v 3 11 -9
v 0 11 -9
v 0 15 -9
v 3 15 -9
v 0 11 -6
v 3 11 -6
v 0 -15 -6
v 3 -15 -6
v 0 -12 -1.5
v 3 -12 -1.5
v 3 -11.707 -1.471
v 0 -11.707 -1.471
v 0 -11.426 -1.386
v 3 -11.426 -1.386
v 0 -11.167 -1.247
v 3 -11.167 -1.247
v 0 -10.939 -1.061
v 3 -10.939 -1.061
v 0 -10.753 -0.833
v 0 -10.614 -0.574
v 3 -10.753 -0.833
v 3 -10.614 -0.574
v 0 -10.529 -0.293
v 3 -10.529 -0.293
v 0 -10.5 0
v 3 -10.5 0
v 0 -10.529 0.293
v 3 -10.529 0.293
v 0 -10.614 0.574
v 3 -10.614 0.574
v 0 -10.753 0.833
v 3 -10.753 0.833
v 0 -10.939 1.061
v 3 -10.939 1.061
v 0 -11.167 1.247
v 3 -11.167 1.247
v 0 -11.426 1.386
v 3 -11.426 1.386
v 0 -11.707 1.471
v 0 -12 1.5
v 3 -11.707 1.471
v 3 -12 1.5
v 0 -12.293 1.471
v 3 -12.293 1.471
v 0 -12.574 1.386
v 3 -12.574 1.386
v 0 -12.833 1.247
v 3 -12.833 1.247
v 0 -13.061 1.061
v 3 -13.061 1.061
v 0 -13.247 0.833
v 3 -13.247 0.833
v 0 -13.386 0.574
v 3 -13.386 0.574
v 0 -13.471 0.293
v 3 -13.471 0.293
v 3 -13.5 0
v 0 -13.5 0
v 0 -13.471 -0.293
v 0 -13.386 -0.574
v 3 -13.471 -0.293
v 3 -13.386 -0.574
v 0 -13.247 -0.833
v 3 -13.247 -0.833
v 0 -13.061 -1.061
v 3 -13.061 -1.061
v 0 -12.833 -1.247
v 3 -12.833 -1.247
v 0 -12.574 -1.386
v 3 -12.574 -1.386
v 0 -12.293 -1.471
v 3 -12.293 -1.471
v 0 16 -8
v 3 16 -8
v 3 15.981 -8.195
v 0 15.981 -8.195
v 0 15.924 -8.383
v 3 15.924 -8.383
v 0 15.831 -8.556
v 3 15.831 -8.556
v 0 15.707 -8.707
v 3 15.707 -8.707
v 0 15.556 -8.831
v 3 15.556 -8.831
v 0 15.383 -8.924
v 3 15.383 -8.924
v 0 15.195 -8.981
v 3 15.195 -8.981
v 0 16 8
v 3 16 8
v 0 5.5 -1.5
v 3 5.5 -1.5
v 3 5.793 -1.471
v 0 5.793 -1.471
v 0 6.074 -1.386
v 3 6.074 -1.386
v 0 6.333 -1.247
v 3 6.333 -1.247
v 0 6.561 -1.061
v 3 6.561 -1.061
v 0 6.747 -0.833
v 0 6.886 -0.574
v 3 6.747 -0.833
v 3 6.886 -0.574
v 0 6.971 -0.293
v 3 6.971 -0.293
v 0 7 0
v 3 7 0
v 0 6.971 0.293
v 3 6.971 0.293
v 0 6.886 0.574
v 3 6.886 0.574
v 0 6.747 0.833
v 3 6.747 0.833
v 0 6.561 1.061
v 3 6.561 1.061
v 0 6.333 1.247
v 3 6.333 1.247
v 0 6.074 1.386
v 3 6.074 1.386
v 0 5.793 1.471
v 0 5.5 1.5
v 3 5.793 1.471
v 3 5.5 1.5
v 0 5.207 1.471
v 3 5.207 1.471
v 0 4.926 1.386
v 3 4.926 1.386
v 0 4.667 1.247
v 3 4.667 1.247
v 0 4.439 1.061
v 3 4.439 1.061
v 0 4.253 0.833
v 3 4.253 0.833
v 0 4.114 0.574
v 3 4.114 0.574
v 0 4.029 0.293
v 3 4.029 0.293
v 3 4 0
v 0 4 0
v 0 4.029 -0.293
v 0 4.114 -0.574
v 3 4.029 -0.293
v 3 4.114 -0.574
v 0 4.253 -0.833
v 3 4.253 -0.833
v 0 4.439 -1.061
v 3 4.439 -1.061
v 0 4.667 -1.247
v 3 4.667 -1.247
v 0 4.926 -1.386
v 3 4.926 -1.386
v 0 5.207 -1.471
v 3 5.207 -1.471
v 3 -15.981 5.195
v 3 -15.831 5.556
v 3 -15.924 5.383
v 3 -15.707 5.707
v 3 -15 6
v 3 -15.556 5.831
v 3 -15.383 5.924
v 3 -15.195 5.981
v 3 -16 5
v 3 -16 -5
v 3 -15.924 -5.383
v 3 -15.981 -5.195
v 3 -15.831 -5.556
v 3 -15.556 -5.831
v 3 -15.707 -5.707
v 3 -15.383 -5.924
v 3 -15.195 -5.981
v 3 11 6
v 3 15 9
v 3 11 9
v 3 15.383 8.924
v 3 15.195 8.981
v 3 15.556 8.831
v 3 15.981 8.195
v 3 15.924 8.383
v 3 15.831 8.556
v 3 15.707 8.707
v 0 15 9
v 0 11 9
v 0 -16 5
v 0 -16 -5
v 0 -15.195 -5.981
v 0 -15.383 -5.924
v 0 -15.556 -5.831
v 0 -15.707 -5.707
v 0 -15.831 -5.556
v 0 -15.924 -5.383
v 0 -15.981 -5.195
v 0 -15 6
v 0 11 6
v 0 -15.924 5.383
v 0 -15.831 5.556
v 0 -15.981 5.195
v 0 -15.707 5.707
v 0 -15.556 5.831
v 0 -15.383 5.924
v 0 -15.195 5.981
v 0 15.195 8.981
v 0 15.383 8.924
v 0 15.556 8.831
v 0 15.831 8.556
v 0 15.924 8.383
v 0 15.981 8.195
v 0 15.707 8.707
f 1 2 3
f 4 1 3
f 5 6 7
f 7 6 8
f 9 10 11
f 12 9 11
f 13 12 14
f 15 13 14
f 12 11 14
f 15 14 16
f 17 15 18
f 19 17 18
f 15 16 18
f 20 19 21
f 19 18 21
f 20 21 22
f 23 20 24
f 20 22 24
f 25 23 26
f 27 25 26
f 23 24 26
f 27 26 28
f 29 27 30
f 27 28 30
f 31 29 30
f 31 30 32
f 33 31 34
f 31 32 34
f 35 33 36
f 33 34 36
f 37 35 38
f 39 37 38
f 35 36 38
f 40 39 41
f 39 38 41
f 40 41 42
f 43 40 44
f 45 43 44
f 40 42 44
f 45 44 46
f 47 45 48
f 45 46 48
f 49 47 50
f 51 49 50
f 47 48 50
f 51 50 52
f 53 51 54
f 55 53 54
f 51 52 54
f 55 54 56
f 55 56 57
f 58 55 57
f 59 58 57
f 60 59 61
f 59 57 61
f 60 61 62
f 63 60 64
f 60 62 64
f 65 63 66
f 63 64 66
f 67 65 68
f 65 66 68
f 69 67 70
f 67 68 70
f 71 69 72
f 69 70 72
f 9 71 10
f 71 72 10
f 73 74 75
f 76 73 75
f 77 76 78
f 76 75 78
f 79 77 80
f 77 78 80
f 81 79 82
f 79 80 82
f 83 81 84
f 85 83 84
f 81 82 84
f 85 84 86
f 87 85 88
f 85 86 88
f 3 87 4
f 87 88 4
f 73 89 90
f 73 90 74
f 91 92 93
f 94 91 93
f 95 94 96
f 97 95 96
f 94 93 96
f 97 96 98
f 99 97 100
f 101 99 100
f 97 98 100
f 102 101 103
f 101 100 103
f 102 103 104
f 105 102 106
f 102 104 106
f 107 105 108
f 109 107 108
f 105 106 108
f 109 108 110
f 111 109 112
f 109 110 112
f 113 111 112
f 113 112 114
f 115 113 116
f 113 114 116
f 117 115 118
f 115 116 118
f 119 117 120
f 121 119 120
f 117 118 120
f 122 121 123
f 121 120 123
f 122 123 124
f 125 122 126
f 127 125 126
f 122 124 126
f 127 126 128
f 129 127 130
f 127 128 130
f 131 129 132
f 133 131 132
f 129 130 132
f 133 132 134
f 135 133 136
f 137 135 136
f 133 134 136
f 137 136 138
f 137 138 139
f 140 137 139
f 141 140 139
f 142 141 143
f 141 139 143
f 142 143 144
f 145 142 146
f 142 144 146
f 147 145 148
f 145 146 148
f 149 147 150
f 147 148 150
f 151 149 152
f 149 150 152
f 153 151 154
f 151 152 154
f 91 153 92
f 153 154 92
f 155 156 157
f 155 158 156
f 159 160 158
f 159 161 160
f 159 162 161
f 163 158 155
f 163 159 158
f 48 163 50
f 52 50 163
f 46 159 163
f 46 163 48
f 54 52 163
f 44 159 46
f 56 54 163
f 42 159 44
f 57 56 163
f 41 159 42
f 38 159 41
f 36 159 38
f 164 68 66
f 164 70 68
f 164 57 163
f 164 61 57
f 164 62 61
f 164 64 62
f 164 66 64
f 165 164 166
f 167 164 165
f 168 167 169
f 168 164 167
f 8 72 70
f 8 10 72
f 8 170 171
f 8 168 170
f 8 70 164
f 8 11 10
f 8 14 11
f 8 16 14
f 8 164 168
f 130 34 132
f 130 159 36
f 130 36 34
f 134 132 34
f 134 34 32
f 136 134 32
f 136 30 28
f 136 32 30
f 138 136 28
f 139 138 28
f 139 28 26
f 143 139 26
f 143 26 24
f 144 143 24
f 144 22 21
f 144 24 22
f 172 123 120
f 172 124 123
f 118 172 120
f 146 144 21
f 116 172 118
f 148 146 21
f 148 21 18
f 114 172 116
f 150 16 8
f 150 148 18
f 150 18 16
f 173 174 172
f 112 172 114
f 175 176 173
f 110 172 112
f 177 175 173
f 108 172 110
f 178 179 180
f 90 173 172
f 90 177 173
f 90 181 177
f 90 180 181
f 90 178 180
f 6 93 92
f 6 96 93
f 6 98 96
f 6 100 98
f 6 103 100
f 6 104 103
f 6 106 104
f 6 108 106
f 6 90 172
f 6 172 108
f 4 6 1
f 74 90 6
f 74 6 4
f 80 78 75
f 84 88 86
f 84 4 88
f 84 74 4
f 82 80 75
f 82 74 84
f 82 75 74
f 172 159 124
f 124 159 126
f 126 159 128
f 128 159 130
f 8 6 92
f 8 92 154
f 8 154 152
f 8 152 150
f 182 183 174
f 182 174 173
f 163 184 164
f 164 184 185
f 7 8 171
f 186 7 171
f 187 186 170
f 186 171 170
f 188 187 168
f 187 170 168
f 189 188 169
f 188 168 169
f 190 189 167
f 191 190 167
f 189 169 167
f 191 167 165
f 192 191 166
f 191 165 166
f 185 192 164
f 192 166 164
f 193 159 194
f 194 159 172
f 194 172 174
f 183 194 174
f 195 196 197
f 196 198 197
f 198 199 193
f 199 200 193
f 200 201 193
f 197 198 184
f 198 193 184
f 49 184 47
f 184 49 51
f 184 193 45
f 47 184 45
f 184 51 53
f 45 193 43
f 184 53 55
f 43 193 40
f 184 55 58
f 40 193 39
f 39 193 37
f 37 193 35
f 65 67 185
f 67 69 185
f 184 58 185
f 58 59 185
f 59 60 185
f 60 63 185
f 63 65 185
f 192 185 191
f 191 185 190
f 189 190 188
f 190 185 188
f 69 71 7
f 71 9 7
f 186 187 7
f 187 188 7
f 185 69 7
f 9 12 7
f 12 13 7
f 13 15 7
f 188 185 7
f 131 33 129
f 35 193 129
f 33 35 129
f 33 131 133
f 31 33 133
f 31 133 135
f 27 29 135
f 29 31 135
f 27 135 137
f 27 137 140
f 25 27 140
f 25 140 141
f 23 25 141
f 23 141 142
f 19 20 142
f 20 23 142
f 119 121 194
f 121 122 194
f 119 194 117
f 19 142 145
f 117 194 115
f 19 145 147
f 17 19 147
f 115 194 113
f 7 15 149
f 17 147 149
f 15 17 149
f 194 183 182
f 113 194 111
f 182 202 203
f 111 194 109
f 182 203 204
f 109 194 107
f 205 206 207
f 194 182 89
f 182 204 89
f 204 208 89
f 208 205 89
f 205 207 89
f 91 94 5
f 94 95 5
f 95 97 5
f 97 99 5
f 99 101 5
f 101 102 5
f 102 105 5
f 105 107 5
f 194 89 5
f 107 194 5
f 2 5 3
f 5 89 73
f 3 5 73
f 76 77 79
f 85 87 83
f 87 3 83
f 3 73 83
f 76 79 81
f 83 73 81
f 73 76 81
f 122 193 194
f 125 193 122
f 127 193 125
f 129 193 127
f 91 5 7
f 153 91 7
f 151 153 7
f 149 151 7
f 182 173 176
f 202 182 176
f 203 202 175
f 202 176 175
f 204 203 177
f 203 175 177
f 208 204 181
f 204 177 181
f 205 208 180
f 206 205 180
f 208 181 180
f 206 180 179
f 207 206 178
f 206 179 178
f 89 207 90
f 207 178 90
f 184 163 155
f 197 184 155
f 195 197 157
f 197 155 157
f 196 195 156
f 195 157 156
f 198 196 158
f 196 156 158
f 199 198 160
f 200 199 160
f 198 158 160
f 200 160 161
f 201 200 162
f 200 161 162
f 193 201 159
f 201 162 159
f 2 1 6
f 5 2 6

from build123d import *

# Parameters (mm, degrees)
SKETCH1_W           = 18
SKETCH1_H           = 32
BOSS_EXTRUDE1_DEPTH = 3
SKETCH2_R           = 1.5
CUT_EXTRUDE2_DEPTH  = 3


with BuildPart() as part:
    # Sketch1 → Boss-Extrude1 (new body)
    with BuildSketch(Plane(origin=(0, 0, 0), x_dir=(0, 0, -1), z_dir=(1, 0, 0))):
        Rectangle(SKETCH1_W, SKETCH1_H)
    extrude(amount=BOSS_EXTRUDE1_DEPTH)

    # Sketch2 → Cut-Extrude2 (cut)
    with BuildSketch(Plane(origin=(3, 0, 0), x_dir=(0, 0, -1), z_dir=(1, 0, 0))):
        with BuildLine():
            ThreePointArc((8, 16), (8.707106781, 15.707106781), (9, 15))
            Line((9, 15), (9, 16))
            Line((9, 16), (8, 16))
        make_face()
        with BuildLine():
            ThreePointArc((-9, 15), (-8.707106781, 15.707106781), (-8, 16))
            Line((-8, 16), (-9, 16))
            Line((-9, 16), (-9, 15))
        make_face()
        with BuildLine():
            Line((-6, -16), (-5, -16))
            ThreePointArc((-5, -16), (-5.707106781, -15.707106781), (-6, -15))
            Line((-6, -15), (-6, 11))
            Line((-6, 11), (-9, 11))
            Line((-9, 11), (-9, -16))
            Line((-9, -16), (-6, -16))
        make_face()
        with BuildLine():
            Line((6, 11), (6, -15))
            ThreePointArc((6, -15), (5.707106781, -15.707106781), (5, -16))
            Line((5, -16), (6, -16))
            Line((6, -16), (9, -16))
            Line((9, -16), (9, 11))
            Line((9, 11), (6, 11))
        make_face()
        with Locations((0, 5.5)):
            Circle(SKETCH2_R)
        with Locations((0, -12)):
            Circle(SKETCH2_R)
    extrude(amount=-CUT_EXTRUDE2_DEPTH, mode=Mode.SUBTRACT)


solid = part.part
